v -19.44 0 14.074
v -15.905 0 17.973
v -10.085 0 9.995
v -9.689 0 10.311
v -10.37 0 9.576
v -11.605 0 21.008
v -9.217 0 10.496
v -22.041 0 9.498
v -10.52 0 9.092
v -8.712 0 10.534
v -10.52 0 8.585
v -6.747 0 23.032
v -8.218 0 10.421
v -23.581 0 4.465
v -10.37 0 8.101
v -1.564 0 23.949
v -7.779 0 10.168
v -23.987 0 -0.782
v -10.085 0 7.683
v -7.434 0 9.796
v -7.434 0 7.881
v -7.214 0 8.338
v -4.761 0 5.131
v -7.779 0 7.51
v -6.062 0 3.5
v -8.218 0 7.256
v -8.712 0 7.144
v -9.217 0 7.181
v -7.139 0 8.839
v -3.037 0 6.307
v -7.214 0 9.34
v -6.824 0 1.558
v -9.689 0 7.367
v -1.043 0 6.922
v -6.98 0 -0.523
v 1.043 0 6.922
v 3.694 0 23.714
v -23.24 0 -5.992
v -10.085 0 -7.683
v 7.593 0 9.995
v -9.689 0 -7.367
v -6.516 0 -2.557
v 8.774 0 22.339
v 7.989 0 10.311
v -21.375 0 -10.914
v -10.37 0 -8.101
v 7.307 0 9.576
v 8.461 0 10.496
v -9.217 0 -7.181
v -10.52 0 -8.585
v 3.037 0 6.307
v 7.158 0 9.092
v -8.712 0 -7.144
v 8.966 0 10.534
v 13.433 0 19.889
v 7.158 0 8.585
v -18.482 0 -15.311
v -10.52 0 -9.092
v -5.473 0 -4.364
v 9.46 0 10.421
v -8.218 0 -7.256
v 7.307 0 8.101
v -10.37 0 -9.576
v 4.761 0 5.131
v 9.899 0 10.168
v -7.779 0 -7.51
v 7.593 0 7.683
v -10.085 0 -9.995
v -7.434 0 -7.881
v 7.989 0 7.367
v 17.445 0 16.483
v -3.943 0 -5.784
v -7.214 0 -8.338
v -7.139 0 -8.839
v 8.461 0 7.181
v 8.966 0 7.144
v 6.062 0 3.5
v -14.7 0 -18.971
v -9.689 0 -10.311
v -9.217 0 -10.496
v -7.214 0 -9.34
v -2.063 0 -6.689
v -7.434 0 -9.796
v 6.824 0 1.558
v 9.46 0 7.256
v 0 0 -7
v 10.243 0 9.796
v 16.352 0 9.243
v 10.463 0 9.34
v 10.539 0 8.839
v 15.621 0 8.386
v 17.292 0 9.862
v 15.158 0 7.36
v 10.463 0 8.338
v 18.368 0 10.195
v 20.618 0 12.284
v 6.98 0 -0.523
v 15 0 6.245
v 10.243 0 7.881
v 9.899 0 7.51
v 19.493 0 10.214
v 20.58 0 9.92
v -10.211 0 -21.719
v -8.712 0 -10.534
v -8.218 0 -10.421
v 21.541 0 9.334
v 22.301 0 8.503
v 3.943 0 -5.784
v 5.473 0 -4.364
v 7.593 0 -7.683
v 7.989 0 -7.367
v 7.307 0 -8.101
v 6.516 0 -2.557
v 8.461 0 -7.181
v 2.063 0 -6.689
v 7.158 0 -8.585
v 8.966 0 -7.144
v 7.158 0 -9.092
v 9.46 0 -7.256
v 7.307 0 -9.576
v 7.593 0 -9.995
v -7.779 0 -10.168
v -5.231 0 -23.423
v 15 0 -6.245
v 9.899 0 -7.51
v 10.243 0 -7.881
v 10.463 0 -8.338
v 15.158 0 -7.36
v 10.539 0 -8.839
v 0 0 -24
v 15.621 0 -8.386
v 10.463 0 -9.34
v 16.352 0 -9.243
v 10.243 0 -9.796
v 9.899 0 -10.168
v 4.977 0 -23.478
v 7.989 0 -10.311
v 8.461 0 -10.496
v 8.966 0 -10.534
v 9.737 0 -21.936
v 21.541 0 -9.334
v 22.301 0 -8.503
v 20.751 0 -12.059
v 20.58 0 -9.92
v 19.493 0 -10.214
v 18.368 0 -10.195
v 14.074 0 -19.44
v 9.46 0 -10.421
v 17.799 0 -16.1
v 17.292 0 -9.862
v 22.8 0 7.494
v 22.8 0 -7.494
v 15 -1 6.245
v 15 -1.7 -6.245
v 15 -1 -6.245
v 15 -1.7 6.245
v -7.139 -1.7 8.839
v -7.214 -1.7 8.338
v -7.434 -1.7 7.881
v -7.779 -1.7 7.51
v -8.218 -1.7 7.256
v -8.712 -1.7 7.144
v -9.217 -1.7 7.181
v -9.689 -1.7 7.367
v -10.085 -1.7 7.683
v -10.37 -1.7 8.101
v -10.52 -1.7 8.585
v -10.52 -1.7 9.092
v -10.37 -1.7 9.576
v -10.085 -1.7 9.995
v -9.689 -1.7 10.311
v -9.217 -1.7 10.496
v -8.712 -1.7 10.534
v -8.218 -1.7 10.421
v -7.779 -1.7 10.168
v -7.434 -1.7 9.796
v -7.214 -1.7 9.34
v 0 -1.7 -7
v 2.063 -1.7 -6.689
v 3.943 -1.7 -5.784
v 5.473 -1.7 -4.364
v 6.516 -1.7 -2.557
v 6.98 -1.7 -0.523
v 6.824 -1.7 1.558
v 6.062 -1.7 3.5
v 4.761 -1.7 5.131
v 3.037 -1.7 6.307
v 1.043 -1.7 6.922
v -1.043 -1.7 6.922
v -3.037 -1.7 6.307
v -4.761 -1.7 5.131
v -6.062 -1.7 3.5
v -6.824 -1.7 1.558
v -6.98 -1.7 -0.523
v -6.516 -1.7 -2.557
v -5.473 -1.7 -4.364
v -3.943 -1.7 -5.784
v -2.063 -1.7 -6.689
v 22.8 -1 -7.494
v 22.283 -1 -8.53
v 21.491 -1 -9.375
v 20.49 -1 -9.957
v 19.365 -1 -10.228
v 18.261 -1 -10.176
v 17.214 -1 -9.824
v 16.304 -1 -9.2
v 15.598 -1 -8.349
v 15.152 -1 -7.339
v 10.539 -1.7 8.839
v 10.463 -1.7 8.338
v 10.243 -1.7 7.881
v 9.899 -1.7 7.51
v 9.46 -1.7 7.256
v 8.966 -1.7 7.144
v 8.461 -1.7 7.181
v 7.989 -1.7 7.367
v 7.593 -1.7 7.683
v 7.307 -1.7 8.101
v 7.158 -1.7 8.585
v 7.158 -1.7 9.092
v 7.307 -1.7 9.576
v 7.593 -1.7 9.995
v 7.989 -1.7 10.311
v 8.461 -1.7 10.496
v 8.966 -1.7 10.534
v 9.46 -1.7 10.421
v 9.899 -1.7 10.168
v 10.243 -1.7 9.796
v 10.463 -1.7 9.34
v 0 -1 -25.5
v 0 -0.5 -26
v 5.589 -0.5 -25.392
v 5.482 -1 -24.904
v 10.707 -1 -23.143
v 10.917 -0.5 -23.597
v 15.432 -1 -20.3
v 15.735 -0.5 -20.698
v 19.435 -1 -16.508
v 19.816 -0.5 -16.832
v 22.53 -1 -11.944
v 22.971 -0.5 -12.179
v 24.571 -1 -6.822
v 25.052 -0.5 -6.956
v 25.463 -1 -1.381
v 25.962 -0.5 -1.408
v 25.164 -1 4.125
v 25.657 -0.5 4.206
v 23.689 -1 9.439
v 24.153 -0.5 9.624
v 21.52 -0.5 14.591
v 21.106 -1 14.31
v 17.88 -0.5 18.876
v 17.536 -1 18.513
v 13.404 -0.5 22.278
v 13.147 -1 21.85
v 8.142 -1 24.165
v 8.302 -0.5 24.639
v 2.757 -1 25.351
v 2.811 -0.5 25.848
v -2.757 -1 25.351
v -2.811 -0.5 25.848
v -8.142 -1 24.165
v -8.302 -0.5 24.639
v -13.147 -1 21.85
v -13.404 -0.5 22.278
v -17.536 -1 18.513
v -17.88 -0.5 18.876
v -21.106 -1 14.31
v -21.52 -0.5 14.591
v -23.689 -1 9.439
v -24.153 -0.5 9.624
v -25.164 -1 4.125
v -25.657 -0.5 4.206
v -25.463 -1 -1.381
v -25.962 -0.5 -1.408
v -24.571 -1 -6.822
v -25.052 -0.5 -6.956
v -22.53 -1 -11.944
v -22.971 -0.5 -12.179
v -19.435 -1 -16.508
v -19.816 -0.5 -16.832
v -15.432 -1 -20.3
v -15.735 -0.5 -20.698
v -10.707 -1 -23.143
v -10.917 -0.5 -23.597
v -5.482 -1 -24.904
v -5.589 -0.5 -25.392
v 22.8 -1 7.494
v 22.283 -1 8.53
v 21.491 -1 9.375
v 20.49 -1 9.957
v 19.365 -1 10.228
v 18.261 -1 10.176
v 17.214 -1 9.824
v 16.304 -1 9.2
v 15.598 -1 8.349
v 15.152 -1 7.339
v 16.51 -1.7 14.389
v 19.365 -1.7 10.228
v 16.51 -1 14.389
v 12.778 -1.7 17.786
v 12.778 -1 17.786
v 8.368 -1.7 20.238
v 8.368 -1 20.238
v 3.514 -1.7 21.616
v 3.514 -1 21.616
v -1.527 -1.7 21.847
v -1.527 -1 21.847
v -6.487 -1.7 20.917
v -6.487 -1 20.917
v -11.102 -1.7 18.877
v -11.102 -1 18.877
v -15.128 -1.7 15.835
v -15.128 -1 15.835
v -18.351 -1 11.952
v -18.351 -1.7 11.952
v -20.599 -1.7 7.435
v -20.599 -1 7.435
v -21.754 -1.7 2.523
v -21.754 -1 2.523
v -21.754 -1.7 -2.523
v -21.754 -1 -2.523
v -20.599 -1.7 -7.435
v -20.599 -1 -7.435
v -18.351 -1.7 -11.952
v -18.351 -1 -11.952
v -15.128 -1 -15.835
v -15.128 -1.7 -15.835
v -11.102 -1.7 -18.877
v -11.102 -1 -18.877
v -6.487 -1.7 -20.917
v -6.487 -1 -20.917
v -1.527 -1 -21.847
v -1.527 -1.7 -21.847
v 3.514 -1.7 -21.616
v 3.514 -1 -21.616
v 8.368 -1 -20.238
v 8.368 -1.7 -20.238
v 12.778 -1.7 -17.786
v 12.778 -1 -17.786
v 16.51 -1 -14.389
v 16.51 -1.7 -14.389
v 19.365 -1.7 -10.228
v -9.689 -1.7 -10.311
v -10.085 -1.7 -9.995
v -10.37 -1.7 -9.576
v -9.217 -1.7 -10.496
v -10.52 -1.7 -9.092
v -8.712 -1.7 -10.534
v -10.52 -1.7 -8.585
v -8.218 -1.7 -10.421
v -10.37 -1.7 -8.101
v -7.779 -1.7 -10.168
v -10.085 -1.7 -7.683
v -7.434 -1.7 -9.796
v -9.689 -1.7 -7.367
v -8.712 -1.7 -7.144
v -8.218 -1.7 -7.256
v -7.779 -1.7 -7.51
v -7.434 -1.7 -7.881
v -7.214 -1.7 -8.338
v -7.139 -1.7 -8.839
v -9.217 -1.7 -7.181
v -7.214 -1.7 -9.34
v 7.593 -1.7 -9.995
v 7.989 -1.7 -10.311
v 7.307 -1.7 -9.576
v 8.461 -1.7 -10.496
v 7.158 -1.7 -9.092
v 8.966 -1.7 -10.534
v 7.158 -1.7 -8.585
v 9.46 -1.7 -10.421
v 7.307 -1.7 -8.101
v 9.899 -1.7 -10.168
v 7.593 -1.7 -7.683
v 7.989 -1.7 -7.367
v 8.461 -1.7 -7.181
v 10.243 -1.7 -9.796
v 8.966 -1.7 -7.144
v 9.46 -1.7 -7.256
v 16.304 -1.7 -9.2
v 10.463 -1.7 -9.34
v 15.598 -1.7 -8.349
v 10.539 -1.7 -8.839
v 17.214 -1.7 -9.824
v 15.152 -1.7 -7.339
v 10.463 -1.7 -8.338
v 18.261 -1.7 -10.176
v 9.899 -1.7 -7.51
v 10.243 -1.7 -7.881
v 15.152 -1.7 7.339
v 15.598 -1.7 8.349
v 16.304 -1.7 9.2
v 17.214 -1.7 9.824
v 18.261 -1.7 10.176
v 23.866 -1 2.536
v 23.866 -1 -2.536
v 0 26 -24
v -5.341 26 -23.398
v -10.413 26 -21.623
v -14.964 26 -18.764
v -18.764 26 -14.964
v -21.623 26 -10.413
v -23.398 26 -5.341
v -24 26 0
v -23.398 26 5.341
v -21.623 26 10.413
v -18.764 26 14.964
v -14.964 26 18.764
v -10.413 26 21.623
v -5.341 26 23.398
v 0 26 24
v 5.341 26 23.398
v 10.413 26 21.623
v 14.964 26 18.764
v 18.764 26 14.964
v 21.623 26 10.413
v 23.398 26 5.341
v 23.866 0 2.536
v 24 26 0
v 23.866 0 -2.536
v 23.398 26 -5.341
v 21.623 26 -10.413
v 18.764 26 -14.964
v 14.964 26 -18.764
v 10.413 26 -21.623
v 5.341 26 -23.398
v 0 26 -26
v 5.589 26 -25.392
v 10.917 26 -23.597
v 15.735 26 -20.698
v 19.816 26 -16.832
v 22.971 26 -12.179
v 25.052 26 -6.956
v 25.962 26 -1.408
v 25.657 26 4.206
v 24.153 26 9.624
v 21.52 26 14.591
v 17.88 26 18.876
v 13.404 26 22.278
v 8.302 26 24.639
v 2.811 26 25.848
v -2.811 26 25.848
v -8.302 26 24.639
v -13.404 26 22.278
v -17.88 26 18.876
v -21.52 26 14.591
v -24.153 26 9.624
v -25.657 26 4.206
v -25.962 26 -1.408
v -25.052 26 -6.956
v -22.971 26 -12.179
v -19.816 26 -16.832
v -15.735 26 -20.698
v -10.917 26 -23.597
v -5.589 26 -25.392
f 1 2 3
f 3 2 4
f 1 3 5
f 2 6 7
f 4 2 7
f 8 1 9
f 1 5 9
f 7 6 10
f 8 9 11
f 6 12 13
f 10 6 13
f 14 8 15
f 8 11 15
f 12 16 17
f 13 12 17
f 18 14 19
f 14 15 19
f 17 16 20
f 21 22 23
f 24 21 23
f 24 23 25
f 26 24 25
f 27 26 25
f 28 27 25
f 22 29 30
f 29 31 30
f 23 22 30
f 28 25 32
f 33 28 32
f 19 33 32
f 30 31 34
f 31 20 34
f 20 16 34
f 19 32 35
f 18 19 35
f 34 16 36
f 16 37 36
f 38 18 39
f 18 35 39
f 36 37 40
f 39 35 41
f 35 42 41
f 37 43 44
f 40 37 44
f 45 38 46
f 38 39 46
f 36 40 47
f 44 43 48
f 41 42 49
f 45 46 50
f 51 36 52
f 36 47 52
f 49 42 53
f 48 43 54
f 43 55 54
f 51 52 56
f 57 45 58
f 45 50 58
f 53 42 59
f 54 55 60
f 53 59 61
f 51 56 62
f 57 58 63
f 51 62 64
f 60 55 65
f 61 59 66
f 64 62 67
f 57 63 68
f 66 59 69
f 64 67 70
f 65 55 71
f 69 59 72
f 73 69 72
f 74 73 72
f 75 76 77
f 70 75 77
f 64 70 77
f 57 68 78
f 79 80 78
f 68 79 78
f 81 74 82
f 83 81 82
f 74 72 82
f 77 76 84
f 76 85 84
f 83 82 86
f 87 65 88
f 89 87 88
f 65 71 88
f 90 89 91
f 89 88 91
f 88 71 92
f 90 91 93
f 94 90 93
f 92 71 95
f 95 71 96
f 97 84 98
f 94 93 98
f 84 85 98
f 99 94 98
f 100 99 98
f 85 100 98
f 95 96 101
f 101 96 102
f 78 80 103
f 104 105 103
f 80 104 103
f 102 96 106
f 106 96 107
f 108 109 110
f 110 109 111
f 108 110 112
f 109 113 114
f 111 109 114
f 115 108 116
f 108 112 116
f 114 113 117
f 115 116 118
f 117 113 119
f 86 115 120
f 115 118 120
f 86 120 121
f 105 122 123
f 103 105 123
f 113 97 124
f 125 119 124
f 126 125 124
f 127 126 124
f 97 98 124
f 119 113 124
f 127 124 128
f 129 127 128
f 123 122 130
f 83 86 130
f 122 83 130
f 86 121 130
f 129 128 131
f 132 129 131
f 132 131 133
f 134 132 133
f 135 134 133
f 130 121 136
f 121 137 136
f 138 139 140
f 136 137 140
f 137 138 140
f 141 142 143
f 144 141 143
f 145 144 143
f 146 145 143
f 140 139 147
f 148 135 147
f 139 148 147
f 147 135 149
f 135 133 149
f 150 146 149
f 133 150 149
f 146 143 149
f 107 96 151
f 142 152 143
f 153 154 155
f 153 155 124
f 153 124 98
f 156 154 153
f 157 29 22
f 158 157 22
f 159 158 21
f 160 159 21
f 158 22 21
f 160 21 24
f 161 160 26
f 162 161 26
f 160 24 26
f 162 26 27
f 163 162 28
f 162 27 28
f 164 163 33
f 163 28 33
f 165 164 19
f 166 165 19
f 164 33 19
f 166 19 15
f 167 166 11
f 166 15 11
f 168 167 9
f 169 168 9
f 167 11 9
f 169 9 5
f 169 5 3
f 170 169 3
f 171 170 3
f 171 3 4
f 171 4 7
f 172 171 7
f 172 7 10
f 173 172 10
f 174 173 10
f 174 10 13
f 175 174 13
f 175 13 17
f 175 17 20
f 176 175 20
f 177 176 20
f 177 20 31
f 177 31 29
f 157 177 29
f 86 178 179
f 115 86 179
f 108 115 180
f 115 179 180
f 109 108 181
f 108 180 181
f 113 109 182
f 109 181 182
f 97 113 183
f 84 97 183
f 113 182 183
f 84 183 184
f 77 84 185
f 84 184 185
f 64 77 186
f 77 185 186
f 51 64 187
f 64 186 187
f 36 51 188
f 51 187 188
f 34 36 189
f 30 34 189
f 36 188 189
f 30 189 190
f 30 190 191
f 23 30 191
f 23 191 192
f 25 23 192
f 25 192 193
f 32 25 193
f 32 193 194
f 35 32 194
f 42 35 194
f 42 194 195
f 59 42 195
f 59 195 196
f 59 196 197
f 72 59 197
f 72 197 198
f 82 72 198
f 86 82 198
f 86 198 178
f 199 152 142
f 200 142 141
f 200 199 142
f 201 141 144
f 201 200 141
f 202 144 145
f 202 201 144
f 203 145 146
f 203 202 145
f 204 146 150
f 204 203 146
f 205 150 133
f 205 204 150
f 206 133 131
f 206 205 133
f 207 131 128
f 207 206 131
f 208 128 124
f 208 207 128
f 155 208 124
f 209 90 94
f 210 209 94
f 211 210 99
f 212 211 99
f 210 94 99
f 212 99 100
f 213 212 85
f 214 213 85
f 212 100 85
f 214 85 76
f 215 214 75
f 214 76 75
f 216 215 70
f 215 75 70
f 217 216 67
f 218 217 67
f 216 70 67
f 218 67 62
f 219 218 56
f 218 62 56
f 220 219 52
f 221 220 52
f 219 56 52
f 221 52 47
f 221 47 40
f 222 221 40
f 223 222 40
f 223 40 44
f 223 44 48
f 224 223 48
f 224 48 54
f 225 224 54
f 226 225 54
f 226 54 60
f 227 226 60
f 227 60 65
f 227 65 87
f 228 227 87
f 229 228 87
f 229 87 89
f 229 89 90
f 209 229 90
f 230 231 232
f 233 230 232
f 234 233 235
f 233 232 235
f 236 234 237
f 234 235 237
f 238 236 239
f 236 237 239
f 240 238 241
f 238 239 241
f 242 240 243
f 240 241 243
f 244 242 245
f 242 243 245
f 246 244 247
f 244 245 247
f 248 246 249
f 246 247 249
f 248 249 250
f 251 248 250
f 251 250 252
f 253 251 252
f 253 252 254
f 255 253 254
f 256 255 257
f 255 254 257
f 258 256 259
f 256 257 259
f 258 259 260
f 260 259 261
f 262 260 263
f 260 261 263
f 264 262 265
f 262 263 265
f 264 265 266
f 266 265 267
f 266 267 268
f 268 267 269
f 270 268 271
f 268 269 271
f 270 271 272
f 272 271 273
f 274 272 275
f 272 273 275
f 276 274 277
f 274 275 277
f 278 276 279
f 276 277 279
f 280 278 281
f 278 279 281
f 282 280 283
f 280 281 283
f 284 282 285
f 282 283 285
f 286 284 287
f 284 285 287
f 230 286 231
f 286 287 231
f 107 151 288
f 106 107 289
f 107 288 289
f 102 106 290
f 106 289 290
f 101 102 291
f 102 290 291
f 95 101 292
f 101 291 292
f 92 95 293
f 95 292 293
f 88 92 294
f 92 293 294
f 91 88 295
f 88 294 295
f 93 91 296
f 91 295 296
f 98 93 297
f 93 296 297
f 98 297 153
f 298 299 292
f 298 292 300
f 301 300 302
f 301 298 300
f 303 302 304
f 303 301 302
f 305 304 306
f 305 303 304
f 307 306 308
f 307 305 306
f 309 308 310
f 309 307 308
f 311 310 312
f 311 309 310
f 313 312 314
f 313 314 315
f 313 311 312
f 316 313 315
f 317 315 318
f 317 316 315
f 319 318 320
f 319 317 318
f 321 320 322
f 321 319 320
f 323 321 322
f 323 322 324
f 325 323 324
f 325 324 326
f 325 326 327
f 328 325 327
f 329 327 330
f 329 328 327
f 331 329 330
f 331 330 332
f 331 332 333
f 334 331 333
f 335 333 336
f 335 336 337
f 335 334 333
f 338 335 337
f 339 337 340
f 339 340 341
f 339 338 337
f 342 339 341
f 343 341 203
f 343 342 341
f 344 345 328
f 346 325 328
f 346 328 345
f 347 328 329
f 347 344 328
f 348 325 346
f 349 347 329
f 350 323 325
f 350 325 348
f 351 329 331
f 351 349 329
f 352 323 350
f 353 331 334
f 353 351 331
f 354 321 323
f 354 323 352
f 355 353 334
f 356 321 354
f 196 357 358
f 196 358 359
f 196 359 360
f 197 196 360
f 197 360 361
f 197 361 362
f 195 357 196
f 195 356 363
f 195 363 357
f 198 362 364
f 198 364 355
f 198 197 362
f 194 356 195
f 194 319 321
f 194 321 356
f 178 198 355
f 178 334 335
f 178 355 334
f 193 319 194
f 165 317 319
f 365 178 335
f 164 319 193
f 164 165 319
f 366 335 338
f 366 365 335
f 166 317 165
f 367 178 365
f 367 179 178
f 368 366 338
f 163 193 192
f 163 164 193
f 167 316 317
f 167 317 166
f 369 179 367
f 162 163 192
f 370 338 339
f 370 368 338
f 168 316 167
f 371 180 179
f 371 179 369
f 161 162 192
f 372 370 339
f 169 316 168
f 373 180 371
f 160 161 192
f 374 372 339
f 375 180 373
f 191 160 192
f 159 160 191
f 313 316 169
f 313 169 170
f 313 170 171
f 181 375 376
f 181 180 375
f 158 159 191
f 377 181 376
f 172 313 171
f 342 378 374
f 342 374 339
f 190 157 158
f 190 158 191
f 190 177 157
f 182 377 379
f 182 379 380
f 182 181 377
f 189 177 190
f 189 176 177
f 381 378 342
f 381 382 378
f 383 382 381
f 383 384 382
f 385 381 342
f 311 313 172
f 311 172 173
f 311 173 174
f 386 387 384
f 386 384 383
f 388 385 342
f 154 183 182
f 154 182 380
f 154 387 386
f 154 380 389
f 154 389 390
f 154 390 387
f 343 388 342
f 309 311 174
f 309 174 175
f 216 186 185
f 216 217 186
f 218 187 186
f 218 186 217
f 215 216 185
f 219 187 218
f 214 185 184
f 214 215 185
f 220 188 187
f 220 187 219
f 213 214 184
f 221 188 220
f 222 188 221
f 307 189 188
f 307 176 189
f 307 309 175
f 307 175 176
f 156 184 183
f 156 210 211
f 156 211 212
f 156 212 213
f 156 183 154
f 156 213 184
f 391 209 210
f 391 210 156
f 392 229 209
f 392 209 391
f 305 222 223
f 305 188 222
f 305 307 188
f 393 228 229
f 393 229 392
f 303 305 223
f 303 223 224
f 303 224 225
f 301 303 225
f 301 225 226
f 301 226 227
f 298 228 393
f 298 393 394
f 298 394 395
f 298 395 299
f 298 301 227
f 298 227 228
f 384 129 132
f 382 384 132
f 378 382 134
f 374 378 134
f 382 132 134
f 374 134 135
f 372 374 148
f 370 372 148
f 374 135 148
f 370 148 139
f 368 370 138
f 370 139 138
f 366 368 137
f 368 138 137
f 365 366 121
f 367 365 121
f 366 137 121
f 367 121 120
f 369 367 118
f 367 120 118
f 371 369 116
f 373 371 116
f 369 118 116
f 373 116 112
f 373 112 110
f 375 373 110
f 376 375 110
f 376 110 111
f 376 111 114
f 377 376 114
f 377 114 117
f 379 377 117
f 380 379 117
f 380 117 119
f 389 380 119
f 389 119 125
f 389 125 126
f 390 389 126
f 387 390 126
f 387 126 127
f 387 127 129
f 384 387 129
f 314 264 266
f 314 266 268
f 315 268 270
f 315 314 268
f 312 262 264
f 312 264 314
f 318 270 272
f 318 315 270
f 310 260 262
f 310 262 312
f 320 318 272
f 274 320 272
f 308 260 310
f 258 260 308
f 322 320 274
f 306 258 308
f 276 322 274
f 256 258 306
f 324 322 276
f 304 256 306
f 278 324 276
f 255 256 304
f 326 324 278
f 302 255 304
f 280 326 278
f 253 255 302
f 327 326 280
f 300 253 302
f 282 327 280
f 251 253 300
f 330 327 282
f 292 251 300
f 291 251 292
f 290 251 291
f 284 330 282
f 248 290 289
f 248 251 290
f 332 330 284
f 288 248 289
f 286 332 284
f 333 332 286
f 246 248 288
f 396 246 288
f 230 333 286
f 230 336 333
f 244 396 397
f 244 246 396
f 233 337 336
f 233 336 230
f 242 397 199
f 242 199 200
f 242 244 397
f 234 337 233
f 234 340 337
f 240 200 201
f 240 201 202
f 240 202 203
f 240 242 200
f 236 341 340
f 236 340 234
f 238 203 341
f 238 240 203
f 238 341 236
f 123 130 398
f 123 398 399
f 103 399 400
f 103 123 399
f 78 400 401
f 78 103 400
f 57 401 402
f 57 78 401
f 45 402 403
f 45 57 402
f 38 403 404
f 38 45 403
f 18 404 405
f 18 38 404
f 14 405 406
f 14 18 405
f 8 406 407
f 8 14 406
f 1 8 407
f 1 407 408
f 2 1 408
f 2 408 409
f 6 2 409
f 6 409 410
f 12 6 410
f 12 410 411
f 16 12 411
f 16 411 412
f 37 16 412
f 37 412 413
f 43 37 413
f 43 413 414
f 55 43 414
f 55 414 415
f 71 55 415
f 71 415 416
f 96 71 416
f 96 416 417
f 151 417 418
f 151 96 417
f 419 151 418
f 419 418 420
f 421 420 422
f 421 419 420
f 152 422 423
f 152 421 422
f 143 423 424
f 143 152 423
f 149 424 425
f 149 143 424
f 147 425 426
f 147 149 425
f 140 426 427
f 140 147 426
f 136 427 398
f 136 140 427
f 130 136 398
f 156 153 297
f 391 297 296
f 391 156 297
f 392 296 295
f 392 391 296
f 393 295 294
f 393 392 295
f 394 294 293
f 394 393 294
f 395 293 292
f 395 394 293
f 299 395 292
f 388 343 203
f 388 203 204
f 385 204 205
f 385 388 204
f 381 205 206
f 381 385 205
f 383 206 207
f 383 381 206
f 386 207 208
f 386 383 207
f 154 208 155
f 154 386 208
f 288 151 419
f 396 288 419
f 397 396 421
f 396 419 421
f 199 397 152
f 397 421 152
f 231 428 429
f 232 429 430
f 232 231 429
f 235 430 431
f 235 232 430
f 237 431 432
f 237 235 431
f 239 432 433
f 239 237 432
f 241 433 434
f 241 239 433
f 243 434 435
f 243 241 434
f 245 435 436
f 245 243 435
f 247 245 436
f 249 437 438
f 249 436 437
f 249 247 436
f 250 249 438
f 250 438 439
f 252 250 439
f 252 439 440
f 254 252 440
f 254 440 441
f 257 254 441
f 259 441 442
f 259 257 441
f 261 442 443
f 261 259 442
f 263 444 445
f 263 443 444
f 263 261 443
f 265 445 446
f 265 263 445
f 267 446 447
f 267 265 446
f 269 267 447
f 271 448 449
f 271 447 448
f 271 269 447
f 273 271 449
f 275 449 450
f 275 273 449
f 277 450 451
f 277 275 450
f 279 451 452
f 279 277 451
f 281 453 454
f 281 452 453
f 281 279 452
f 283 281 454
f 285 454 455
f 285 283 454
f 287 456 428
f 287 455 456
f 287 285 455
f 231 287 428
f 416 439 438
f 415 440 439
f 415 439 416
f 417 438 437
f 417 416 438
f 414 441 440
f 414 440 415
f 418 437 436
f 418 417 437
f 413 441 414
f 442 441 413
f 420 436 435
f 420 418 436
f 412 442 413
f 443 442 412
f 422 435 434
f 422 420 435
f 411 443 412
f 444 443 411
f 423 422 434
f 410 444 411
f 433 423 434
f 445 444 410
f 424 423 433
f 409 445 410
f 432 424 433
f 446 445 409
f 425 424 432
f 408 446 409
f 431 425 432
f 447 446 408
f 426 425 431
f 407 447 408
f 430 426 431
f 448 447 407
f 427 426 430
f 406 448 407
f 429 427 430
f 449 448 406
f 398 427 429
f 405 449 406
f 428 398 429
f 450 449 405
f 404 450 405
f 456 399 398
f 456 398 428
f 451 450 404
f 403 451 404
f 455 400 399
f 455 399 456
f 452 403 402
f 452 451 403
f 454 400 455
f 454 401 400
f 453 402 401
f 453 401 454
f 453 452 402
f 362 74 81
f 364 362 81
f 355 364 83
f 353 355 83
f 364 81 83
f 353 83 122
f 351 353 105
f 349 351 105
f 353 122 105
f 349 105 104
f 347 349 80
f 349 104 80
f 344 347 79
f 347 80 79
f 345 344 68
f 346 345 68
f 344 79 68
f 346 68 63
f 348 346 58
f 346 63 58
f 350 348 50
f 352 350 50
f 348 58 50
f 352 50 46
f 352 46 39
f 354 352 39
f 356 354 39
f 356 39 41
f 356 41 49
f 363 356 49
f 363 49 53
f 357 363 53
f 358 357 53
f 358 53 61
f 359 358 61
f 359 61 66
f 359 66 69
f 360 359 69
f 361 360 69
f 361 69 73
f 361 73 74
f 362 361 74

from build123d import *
from build123d.topology import SkipClean

# Parameters (mm, degrees)
SKETCH_1_R          = 26
SKETCH_1_R_2        = 24
EXTRUDE_1_DEPTH     = 26
EXTRUDE_START       = 1
SKETCH_2_R          = 26
EXTRUDE_2_DEPTH     = 1
CUT_EXTRUDE_4_REACH = 47.033
FILLET_2_R          = 4
EXTRUDE_START_2     = 0.7
EXTRUDE_3_DEPTH     = 0.7
CUT_EXTRUDE_1_REACH = 48.036
SKETCH_4_R          = 7
HOLE_WIZARD_M31_D   = 3.4
CHAMFER_1_SIZE      = 0.5


with BuildPart() as part:
    # Эскиз1 → Бобышка-Вытянуть1 (new body)
    with BuildSketch(Plane(origin=(0, 0, 0), x_dir=(1, 0, 0), z_dir=(0, 1, 0))):
        with Locations(Location((0, 0, 0), (0, 0, 90))):
            Circle(SKETCH_1_R)
        with Locations(Location((0, 0, 0), (0, 0, 90))):
            Circle(SKETCH_1_R_2, mode=Mode.SUBTRACT)
    extrude(amount=EXTRUDE_1_DEPTH)

    # Эскиз2 → Бобышка-Вытянуть2 (add)
    with BuildSketch(Plane.XZ.offset(EXTRUDE_START)):
        with Locations(Location((0, 0, 0), (0, 0, 270))):
            Circle(SKETCH_2_R)
    extrude(amount=-EXTRUDE_2_DEPTH)

    # Эскиз9 → Вырез-Вытянуть4 (cut, up to next)
    with BuildSketch(Plane(origin=(0, 0, 0), x_dir=(1, 0, 0), z_dir=(0, 1, 0)), mode=Mode.PRIVATE) as cut_extrude_4_sk1:
        with BuildLine():
            Line((15, 18.734993995), (15, -18.734993995))
            ThreePointArc((15, -18.734993995), (24, 0), (15, 18.734993995))
        make_face()
    cut_extrude_4_tool1 = extrude(cut_extrude_4_sk1.sketch, amount=-CUT_EXTRUDE_4_REACH, mode=Mode.PRIVATE) & part.part
    add(cut_extrude_4_tool1.solids().sort_by_distance((18.66496, 0, 0))[0], mode=Mode.SUBTRACT)

    # Скругление2
    fillet_2_edges = [part.edges().sort_by_distance(p)[0] for p in [
        (15, -0.5, -18.734993995),
        (15, -0.5, 18.734993995),
    ]]
    fillet(fillet_2_edges, radius=FILLET_2_R)

    # Эскиз3 → Бобышка-Вытянуть3 (add)
    with SkipClean():  # the faces are left unmerged after this step: merging them gives an invalid solid
        with BuildSketch(Plane.XZ.offset(1).offset(EXTRUDE_START_2)):
            with BuildLine():
                Line((15, -6.244997998), (15, 6.244997998))
                ThreePointArc((15, 6.244997998), (16.303590006, 9.199549257), (19.364686571, 10.22833877))
                ThreePointArc((19.364686571, 10.22833877), (-21.9, 0), (19.364686571, -10.22833877))
                ThreePointArc((19.364686571, -10.22833877), (16.303590006, -9.199549257), (15, -6.244997998))
            make_face()
        extrude(amount=-EXTRUDE_3_DEPTH)

    # Эскиз4 → Вырез-Вытянуть1 (cut, up to next)
    with BuildSketch(Plane.XZ.offset(1.7), mode=Mode.PRIVATE) as cut_extrude_1_sk1:
        with Locations(Location((0, 0, 0), (0, 0, 270))):
            Circle(SKETCH_4_R)
    cut_extrude_1_tool1 = extrude(cut_extrude_1_sk1.sketch, amount=-CUT_EXTRUDE_1_REACH, mode=Mode.PRIVATE) & part.part
    add(cut_extrude_1_tool1.solids().sort_by_distance((0, -1.7, 0))[0], mode=Mode.SUBTRACT)

    # Отверстие с зазором M31 (through all)
    with Locations(Plane(origin=(0, -1.7, 0), x_dir=(-1, 0, 0), z_dir=(0, -1, 0))):
        with Locations((8.838834765, -8.838834765), (-8.838834765, -8.838834765), (-8.838834765, 8.838834765), (8.838834765, 8.838834765)):
            Hole(HOLE_WIZARD_M31_D / 2)

    # Фаска1
    chamfer_1_edges = [part.edges().sort_by_distance(p)[0] for p in [
        (0, -1, 26),
    ]]
    chamfer(chamfer_1_edges, length=CHAMFER_1_SIZE)


solid = part.part
